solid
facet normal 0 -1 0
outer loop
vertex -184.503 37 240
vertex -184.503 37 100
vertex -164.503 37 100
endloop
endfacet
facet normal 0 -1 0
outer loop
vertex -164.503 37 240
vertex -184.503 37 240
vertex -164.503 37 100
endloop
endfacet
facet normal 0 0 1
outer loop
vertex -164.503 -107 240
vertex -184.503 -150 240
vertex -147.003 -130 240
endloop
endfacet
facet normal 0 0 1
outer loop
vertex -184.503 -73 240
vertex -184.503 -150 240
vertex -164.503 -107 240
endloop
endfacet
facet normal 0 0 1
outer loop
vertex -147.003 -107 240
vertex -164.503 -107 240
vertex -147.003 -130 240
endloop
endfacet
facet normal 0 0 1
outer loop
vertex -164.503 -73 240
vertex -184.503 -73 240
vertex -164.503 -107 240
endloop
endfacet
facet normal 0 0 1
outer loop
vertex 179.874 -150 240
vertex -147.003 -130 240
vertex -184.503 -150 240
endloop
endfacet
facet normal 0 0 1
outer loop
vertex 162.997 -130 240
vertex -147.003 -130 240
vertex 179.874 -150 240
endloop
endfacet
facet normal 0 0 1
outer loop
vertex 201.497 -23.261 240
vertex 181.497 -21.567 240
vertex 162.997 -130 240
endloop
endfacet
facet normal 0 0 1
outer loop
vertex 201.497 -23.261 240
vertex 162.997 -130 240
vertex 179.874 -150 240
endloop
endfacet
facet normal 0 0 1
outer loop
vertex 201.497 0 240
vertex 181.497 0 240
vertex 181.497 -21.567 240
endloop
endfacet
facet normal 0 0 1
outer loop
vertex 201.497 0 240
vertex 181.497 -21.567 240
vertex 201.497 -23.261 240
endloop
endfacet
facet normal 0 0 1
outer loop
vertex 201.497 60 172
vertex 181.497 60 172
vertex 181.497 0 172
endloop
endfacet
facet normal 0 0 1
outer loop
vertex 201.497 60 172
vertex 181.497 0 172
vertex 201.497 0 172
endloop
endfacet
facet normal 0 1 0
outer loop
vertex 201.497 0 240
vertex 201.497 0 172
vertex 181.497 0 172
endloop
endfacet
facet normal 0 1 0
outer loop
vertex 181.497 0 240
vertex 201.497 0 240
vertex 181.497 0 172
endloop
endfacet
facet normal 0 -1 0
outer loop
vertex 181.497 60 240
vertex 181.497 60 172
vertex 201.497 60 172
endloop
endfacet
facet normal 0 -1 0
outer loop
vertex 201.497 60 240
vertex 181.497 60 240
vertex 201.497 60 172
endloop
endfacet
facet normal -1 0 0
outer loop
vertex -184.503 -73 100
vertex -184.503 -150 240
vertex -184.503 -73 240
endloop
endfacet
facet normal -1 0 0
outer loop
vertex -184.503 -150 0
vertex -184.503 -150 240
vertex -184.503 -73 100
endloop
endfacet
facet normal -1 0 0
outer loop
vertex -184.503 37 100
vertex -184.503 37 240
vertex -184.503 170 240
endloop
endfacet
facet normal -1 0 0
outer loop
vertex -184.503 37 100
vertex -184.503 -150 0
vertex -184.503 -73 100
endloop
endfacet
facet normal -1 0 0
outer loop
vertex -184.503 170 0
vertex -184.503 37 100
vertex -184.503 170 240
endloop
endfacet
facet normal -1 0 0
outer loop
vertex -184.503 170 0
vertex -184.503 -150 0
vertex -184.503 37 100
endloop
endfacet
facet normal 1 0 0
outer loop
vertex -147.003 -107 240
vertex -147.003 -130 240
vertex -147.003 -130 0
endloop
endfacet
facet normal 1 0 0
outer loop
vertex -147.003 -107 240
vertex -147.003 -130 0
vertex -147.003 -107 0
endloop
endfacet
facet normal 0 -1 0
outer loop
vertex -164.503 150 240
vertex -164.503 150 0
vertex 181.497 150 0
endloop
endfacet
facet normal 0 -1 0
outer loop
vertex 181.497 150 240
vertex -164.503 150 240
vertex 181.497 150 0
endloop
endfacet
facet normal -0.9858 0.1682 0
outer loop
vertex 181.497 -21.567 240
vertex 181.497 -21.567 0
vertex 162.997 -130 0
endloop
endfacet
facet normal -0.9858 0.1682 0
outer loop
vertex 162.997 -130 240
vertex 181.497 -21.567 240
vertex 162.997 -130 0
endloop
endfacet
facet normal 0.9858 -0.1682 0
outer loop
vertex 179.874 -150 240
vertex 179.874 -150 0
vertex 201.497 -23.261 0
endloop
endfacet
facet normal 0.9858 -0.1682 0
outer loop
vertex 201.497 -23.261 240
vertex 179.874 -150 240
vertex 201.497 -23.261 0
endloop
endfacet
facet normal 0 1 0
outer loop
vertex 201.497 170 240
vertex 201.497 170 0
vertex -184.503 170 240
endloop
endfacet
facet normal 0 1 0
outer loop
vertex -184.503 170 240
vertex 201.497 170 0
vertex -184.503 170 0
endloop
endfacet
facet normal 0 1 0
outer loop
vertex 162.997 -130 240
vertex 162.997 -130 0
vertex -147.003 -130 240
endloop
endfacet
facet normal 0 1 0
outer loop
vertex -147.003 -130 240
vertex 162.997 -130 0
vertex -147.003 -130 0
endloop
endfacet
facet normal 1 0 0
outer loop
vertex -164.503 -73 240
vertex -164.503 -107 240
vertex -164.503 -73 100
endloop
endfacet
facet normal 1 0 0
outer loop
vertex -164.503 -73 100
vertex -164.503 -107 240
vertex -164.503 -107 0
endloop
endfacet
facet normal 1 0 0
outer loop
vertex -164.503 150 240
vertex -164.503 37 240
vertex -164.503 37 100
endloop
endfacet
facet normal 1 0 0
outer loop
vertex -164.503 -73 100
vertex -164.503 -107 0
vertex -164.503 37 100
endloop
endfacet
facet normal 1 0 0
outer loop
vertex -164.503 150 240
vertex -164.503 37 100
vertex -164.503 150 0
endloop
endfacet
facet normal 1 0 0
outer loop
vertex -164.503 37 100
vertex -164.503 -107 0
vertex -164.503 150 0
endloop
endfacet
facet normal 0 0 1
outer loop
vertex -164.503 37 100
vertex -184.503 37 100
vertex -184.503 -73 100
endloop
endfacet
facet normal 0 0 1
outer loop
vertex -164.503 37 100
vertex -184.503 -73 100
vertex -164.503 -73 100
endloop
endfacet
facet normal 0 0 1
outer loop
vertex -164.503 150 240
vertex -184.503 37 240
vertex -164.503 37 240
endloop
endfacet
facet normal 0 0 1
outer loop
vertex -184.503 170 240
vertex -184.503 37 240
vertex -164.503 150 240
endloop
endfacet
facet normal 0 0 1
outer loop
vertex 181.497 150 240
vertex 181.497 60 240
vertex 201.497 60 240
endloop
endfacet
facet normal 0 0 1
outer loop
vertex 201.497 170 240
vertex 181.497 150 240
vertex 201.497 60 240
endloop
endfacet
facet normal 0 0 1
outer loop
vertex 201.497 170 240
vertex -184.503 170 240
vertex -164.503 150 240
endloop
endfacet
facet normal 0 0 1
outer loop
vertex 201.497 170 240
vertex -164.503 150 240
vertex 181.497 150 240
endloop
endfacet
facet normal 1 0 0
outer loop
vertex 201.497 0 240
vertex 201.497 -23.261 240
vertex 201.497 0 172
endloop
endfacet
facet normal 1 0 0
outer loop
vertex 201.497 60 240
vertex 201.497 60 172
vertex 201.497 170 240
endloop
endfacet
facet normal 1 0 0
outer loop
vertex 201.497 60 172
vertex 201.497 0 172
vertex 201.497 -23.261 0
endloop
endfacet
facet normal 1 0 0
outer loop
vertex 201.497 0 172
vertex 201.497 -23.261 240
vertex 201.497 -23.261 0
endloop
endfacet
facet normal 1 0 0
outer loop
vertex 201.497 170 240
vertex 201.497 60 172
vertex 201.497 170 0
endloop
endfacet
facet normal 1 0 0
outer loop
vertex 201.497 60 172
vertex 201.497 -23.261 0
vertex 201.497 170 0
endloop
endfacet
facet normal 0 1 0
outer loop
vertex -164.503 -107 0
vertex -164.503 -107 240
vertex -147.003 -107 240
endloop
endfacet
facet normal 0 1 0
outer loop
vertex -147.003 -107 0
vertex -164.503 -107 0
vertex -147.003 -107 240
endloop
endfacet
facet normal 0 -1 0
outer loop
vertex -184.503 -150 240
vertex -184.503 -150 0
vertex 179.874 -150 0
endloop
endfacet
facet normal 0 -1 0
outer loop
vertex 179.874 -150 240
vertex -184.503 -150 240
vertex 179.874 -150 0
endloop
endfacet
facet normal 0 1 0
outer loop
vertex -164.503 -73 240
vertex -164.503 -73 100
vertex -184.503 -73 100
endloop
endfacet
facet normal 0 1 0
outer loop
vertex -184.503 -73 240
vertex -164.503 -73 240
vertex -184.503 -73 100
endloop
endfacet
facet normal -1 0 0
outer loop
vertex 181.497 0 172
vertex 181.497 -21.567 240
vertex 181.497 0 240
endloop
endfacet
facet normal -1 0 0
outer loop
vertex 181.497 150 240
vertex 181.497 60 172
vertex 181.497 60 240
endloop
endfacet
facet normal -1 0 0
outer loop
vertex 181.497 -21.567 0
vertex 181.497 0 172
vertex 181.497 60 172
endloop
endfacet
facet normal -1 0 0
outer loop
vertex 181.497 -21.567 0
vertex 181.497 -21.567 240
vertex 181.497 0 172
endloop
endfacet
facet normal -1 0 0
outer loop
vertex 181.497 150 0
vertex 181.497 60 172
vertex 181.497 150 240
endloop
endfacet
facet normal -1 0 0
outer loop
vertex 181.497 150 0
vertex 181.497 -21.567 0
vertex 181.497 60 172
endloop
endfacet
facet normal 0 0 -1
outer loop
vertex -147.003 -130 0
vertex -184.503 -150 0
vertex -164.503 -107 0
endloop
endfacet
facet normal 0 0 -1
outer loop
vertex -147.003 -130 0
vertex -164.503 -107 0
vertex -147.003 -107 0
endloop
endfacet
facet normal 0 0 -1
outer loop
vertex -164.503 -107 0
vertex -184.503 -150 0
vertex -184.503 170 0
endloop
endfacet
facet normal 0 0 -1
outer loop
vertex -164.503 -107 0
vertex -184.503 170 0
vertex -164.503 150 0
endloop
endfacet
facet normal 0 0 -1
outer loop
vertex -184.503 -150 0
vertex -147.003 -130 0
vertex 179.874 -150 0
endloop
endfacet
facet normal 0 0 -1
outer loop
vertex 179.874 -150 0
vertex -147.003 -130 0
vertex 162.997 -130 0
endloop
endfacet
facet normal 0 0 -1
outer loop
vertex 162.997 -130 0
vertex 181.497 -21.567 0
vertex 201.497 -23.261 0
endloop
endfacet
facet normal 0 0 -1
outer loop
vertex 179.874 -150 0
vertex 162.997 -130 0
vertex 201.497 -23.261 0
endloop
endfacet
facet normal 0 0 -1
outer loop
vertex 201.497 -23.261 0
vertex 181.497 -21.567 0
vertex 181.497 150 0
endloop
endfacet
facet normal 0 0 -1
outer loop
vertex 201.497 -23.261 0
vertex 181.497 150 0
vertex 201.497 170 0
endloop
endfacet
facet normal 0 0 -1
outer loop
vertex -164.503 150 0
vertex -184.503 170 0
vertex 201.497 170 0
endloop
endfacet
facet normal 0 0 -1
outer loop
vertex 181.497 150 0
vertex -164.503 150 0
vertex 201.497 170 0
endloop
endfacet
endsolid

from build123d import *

# Parameters (mm, degrees)
F0_W     = 17.5
F0_H     = 23
F1_DEPTH = 240
F0_W_2   = 20
F0_H_2   = 60
F2_DEPTH = 172
F0_H_3   = 110
F3_DEPTH = 100


with BuildPart() as f1:
    # F0 (on Top) → F1 (new body)
    with BuildSketch(Plane.XY):
        with Locations((-155.7525681257, -118.5)):
            Rectangle(F0_W, F0_H)
        Polygon((-164.5025681257, -107), (-164.5025681257, -73), (-184.5025681257, -73), (-184.5025681257, -150), (179.8741881599, -150), (201.4974318743, -23.2607228812), (201.4974318743, 0), (181.4974318743, 0), (181.4974318743, -21.566840865), (162.9974318743, -130), (-147.0025681257, -130), (-164.5025681257, -130), align=None)
    extrude(amount=F1_DEPTH)



with BuildPart() as f1b:
    # F0 (on Top) → F1, piece 2 (new body)
    with BuildSketch(Plane.XY):
        Polygon((-164.5025681257, 37), (-164.5025681257, 150), (181.4974318743, 150), (181.4974318743, 60), (201.4974318743, 60), (201.4974318743, 170), (-184.5025681257, 170), (-184.5025681257, 37), align=None)
    extrude(amount=F1_DEPTH)


with BuildPart() as f1_1:
    add(f1.part)

    add(f1b.part)  # F2 merges F1b
    # F0 (on Top) → F2 (join)
    with BuildSketch(Plane.XY):
        with Locations((191.4974318743, 30)):
            Rectangle(F0_W_2, F0_H_2)
    extrude(amount=F2_DEPTH)

    # F0 (on Top) → F3 (join)
    with BuildSketch(Plane.XY):
        with Locations((-174.5025681257, -18)):
            Rectangle(F0_W_2, F0_H_3)
    extrude(amount=F3_DEPTH)


solid = f1_1.part
